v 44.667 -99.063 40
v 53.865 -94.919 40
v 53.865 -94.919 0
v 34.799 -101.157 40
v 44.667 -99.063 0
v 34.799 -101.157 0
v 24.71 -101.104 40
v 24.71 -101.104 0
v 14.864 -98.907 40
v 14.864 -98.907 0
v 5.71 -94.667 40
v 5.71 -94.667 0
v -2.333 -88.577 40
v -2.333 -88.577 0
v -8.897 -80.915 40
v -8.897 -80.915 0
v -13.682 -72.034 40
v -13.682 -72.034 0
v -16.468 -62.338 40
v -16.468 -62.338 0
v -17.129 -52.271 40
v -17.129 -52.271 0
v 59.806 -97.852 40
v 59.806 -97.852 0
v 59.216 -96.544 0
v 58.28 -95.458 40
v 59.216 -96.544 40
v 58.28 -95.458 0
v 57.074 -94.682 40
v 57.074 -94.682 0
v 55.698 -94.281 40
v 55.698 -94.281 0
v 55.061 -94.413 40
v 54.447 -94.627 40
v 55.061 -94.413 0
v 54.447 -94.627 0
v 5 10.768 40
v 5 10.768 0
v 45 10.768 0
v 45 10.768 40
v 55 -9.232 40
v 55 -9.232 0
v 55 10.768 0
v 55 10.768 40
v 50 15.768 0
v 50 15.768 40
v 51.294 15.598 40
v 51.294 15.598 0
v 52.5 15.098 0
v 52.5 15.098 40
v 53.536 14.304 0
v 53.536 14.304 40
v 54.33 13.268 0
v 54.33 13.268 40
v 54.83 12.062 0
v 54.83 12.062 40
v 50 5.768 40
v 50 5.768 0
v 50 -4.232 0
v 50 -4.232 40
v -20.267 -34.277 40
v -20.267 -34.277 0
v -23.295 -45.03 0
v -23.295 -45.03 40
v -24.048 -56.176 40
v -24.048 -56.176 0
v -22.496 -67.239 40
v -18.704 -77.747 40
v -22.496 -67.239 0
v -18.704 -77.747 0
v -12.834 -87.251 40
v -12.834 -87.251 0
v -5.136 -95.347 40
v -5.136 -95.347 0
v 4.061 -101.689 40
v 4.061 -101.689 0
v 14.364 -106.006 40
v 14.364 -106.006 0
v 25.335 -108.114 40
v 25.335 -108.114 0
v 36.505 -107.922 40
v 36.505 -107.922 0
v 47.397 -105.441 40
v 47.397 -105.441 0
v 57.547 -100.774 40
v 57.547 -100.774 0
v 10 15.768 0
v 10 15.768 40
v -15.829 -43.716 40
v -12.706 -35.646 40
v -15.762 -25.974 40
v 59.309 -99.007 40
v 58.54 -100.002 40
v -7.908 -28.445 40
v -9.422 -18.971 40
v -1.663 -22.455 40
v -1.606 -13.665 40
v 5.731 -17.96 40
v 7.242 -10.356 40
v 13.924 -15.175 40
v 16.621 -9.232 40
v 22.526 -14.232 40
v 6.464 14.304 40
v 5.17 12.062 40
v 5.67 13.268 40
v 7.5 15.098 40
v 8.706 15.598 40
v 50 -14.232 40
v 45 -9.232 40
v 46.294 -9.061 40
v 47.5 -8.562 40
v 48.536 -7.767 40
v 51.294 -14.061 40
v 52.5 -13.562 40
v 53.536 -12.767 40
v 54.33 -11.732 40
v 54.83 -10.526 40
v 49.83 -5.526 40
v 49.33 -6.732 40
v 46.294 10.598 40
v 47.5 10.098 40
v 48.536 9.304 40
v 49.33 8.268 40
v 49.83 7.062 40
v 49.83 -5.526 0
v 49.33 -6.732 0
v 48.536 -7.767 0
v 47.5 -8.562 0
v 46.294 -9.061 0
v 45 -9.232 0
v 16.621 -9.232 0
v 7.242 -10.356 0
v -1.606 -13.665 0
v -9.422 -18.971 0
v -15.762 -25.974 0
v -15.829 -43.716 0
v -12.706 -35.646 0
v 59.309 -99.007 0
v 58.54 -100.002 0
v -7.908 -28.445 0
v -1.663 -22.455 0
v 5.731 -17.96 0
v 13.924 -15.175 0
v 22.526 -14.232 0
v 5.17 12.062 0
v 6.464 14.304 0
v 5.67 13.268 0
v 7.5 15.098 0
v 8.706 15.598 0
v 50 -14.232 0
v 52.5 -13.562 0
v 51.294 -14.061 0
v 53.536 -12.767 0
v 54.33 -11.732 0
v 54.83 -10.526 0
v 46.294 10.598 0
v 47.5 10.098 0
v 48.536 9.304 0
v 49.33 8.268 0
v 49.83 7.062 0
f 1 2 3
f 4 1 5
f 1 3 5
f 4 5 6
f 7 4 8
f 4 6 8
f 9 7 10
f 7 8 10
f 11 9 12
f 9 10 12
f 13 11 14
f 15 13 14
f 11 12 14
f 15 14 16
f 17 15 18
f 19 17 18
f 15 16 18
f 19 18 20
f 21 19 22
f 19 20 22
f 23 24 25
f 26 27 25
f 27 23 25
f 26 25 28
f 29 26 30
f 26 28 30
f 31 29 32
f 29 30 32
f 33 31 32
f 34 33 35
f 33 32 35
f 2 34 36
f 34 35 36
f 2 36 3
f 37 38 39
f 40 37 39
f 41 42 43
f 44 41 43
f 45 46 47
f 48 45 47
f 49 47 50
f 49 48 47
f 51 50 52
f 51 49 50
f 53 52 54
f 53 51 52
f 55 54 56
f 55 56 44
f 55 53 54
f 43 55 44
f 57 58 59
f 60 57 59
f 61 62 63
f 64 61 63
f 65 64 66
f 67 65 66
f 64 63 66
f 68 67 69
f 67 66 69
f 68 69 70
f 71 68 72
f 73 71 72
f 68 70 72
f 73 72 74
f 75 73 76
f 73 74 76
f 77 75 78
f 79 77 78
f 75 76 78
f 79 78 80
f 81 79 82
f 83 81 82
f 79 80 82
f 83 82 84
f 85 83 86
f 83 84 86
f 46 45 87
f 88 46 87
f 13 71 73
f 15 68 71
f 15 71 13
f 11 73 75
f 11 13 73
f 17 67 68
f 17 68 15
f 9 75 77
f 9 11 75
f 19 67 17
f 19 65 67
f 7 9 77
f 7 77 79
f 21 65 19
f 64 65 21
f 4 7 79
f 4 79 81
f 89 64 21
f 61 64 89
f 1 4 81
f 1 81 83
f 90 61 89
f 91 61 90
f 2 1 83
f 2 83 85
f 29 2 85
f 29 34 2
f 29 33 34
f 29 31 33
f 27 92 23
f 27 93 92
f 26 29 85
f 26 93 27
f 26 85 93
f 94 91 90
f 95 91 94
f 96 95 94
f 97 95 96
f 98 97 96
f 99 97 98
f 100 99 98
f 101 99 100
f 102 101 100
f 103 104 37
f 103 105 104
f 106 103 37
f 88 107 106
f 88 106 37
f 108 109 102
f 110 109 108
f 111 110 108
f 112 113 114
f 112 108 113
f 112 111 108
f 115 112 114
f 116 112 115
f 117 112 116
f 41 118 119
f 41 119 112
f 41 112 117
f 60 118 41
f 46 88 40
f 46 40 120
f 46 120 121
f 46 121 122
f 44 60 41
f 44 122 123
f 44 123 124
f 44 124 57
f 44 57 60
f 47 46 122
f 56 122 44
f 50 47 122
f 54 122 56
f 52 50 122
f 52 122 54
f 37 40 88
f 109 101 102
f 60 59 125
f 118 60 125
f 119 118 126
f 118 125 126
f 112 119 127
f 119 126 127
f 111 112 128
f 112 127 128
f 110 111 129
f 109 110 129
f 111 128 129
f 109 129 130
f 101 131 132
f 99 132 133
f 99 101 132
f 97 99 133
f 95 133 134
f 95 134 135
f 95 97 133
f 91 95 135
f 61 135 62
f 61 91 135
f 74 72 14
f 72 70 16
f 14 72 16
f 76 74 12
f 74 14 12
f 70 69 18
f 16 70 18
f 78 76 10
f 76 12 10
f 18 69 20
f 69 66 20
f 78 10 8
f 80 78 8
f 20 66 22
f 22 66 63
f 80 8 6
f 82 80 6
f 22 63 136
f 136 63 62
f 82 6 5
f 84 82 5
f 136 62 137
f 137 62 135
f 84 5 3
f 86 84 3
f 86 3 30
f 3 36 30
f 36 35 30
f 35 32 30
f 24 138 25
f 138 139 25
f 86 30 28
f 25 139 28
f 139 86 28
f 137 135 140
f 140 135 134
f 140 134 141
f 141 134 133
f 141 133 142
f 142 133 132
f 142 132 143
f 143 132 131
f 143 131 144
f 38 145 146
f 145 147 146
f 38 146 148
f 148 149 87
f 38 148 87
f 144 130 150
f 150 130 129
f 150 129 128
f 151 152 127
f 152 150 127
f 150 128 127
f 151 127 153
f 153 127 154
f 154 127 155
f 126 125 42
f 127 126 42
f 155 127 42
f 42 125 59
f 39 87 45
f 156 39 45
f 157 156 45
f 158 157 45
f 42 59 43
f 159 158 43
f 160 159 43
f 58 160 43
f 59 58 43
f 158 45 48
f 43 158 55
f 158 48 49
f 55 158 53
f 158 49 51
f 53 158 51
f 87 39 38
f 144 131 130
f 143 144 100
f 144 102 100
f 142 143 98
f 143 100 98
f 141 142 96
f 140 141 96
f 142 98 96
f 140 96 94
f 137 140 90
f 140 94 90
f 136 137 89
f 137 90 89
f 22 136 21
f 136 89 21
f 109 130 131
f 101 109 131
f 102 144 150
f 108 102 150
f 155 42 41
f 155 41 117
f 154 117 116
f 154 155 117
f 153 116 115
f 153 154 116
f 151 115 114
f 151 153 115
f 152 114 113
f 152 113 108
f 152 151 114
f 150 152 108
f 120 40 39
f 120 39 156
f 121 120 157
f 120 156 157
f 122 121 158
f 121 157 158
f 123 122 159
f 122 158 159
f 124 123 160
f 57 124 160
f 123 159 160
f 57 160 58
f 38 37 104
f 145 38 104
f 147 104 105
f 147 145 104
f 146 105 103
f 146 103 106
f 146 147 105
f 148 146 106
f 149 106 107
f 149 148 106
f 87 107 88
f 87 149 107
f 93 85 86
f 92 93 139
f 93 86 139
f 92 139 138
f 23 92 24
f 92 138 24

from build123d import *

# Parameters (mm, degrees)
F0_W        = 45
F0_H        = 5
F1_DEPTH    = 40
F2_T1_DEPTH = 40
F2_T3_DEPTH = 65
F2_T5_DEPTH = 54.4889687993
F2_T7_DEPTH = 46.9752871377
F3_R        = 39.6889865909


# Not quite as in the source:
# - a fillet or chamfer that OpenCascade refuses, or shapes differently, is made with other operations: its cross-section is extruded or revolved along the edge and cut away or added


with BuildPart() as f1:
    # F0 (on Top) → F1 (new body)
    with BuildSketch(Plane.XY):
        with Locations((27.5, 13.2681977808)):
            Rectangle(F0_W, F0_H)
        with BuildLine():
            Line((50, 10.7681977808), (50, -3.9824241135))
            ThreePointArc((50, -3.9824241135), (52.5291420669, -5.0643561015), (55, -6.273486986))
            Line((55, -6.273486986), (55, 15.7681977808))
            Line((55, 15.7681977808), (50, 15.7681977808))
            Line((50, 15.7681977808), (50, 10.7681977808))
        make_face()
        with BuildLine():
            ThreePointArc((55, -6.273486986), (52.5291420669, -5.0643561015), (50, -3.9824241135))
            Line((50, -3.9824241135), (50, -9.2318022192))
            Line((50, -9.2318022192), (50, -11.5117834926))
            ThreePointArc((50, -11.5117834926), (52.5410653135, -12.7963056669), (55, -14.2318022192))
            Line((55, -14.2318022192), (55, -6.273486986))
        make_face()
        with BuildLine():
            Line((15.8578643763, -9.2318022192), (5, -9.2318022192))
            Line((5, -9.2318022192), (5, -14.2318022192))
            ThreePointArc((5, -14.2318022192), (10.2699038194, -11.3864605272), (15.8578643763, -9.2318022192))
        make_face()
        with BuildLine():
            Line((5, -14.2318022192), (5, -9.2318022192))
            Line((5, -9.2318022192), (0, -9.2318022192))
            ThreePointArc((0, -9.2318022192), (-15, -84.2318022192), (60, -99.2318022192))
            Line((60, -99.2318022192), (60, -94.2318022192))
            Line((60, -94.2318022192), (55, -94.2318022192))
            ThreePointArc((55, -94.2318022192), (-10, -79.2318022192), (5, -14.2318022192))
        make_face()
        with BuildLine():
            ThreePointArc((15.8578643763, -9.2318022192), (10.2699038194, -11.3864605272), (5, -14.2318022192))
            Line((5, -14.2318022192), (50, -14.2318022192))
            Line((50, -14.2318022192), (50, -11.5117834926))
            ThreePointArc((50, -11.5117834926), (47.1090892478, -10.2741059066), (44.1421356237, -9.2318022192))
            Line((44.1421356237, -9.2318022192), (15.8578643763, -9.2318022192))
        make_face()
        with BuildLine():
            Line((50, -9.2318022192), (44.1421356237, -9.2318022192))
            ThreePointArc((44.1421356237, -9.2318022192), (47.1090892478, -10.2741059066), (50, -11.5117834926))
            Line((50, -11.5117834926), (50, -9.2318022192))
        make_face()
        with BuildLine():
            Line((50, -11.5117834926), (50, -14.2318022192))
            Line((50, -14.2318022192), (55, -14.2318022192))
            ThreePointArc((55, -14.2318022192), (52.5410653135, -12.7963056669), (50, -11.5117834926))
        make_face()
    extrude(amount=F1_DEPTH)

    # F2: fillet of radius 5 on 8 edges, made by hand

    # F2_s2 → F2_t1 (join)
    with BuildSketch(Plane.XY):
        with BuildLine():
            ThreePointArc((50, -4.2318022192), (48.5355339059, -7.7673361251), (45, -9.2318022192))
            Line((45, -9.2318022192), (50, -9.2318022192))
            Line((50, -9.2318022192), (50, -4.2318022192))
        make_face()
        with BuildLine():
            ThreePointArc((45, 10.7681977808), (48.5355339059, 9.3037316868), (50, 5.7681977808))
            Line((50, 5.7681977808), (50, 10.7681977808))
            Line((50, 10.7681977808), (45, 10.7681977808))
        make_face()
    extrude(amount=F2_T1_DEPTH)

    # F2_s4 → F2_t3 (cut)
    with BuildSketch(Plane.XY.offset(-12.5)):
        with BuildLine():
            ThreePointArc((55, -9.2318022192), (53.5355339059, -12.7673361251), (50, -14.2318022192))
            Line((50, -14.2318022192), (55, -14.2318022192))
            Line((55, -14.2318022192), (55, -9.2318022192))
        make_face()
        with BuildLine():
            ThreePointArc((50, 15.7681977808), (53.5355339059, 14.3037316868), (55, 10.7681977808))
            Line((55, 10.7681977808), (55, 15.7681977808))
            Line((55, 15.7681977808), (50, 15.7681977808))
        make_face()
        with BuildLine():
            ThreePointArc((5, 10.7681977808), (6.4644660941, 14.3037316868), (10, 15.7681977808))
            Line((10, 15.7681977808), (5, 15.7681977808))
            Line((5, 15.7681977808), (5, 10.7681977808))
        make_face()
        with BuildLine():
            ThreePointArc((60, -99.2318022192), (58.5355339059, -95.6962683132), (55, -94.2318022192))
            Line((55, -94.2318022192), (60, -94.2318022192))
            Line((60, -94.2318022192), (60, -99.2318022192))
        make_face()
    extrude(amount=F2_T3_DEPTH, mode=Mode.SUBTRACT)

    # F2_s6 → F2_t5 (cut)
    with BuildSketch(Plane.XY.offset(-7.2444843997)):
        with BuildLine():
            ThreePointArc((57.546692635, -100.7740381439), (59.3435851077, -98.9477505529), (60, -96.4712069105))
            Line((60, -96.4712069105), (60, -99.2318022192))
            ThreePointArc((60, -99.2318022192), (58.7836773401, -100.019354226), (57.546692635, -100.7740381439))
        make_face()
    extrude(amount=F2_T5_DEPTH, mode=Mode.SUBTRACT)

    # F2_s8 → F2_t7 (cut)
    with BuildSketch(Plane.XY.offset(-3.4876435688)):
        with BuildLine():
            ThreePointArc((56.3950574275, -94.2318022192), (55.0843622501, -94.4066516358), (53.8653367875, -94.9189709584))
            ThreePointArc((53.8653367875, -94.9189709584), (54.4350841017, -94.5793754416), (55, -94.2318022192))
            Line((55, -94.2318022192), (56.3950574275, -94.2318022192))
        make_face()
    extrude(amount=F2_T7_DEPTH, mode=Mode.SUBTRACT)

    # F3
    f3_edges = [f1.edges().sort_by_distance(p)[0] for p in [
        (0, -9.231802, 20),
        (5, -14.231802, 20),
    ]]
    fillet(f3_edges, radius=F3_R)


solid = f1.part
